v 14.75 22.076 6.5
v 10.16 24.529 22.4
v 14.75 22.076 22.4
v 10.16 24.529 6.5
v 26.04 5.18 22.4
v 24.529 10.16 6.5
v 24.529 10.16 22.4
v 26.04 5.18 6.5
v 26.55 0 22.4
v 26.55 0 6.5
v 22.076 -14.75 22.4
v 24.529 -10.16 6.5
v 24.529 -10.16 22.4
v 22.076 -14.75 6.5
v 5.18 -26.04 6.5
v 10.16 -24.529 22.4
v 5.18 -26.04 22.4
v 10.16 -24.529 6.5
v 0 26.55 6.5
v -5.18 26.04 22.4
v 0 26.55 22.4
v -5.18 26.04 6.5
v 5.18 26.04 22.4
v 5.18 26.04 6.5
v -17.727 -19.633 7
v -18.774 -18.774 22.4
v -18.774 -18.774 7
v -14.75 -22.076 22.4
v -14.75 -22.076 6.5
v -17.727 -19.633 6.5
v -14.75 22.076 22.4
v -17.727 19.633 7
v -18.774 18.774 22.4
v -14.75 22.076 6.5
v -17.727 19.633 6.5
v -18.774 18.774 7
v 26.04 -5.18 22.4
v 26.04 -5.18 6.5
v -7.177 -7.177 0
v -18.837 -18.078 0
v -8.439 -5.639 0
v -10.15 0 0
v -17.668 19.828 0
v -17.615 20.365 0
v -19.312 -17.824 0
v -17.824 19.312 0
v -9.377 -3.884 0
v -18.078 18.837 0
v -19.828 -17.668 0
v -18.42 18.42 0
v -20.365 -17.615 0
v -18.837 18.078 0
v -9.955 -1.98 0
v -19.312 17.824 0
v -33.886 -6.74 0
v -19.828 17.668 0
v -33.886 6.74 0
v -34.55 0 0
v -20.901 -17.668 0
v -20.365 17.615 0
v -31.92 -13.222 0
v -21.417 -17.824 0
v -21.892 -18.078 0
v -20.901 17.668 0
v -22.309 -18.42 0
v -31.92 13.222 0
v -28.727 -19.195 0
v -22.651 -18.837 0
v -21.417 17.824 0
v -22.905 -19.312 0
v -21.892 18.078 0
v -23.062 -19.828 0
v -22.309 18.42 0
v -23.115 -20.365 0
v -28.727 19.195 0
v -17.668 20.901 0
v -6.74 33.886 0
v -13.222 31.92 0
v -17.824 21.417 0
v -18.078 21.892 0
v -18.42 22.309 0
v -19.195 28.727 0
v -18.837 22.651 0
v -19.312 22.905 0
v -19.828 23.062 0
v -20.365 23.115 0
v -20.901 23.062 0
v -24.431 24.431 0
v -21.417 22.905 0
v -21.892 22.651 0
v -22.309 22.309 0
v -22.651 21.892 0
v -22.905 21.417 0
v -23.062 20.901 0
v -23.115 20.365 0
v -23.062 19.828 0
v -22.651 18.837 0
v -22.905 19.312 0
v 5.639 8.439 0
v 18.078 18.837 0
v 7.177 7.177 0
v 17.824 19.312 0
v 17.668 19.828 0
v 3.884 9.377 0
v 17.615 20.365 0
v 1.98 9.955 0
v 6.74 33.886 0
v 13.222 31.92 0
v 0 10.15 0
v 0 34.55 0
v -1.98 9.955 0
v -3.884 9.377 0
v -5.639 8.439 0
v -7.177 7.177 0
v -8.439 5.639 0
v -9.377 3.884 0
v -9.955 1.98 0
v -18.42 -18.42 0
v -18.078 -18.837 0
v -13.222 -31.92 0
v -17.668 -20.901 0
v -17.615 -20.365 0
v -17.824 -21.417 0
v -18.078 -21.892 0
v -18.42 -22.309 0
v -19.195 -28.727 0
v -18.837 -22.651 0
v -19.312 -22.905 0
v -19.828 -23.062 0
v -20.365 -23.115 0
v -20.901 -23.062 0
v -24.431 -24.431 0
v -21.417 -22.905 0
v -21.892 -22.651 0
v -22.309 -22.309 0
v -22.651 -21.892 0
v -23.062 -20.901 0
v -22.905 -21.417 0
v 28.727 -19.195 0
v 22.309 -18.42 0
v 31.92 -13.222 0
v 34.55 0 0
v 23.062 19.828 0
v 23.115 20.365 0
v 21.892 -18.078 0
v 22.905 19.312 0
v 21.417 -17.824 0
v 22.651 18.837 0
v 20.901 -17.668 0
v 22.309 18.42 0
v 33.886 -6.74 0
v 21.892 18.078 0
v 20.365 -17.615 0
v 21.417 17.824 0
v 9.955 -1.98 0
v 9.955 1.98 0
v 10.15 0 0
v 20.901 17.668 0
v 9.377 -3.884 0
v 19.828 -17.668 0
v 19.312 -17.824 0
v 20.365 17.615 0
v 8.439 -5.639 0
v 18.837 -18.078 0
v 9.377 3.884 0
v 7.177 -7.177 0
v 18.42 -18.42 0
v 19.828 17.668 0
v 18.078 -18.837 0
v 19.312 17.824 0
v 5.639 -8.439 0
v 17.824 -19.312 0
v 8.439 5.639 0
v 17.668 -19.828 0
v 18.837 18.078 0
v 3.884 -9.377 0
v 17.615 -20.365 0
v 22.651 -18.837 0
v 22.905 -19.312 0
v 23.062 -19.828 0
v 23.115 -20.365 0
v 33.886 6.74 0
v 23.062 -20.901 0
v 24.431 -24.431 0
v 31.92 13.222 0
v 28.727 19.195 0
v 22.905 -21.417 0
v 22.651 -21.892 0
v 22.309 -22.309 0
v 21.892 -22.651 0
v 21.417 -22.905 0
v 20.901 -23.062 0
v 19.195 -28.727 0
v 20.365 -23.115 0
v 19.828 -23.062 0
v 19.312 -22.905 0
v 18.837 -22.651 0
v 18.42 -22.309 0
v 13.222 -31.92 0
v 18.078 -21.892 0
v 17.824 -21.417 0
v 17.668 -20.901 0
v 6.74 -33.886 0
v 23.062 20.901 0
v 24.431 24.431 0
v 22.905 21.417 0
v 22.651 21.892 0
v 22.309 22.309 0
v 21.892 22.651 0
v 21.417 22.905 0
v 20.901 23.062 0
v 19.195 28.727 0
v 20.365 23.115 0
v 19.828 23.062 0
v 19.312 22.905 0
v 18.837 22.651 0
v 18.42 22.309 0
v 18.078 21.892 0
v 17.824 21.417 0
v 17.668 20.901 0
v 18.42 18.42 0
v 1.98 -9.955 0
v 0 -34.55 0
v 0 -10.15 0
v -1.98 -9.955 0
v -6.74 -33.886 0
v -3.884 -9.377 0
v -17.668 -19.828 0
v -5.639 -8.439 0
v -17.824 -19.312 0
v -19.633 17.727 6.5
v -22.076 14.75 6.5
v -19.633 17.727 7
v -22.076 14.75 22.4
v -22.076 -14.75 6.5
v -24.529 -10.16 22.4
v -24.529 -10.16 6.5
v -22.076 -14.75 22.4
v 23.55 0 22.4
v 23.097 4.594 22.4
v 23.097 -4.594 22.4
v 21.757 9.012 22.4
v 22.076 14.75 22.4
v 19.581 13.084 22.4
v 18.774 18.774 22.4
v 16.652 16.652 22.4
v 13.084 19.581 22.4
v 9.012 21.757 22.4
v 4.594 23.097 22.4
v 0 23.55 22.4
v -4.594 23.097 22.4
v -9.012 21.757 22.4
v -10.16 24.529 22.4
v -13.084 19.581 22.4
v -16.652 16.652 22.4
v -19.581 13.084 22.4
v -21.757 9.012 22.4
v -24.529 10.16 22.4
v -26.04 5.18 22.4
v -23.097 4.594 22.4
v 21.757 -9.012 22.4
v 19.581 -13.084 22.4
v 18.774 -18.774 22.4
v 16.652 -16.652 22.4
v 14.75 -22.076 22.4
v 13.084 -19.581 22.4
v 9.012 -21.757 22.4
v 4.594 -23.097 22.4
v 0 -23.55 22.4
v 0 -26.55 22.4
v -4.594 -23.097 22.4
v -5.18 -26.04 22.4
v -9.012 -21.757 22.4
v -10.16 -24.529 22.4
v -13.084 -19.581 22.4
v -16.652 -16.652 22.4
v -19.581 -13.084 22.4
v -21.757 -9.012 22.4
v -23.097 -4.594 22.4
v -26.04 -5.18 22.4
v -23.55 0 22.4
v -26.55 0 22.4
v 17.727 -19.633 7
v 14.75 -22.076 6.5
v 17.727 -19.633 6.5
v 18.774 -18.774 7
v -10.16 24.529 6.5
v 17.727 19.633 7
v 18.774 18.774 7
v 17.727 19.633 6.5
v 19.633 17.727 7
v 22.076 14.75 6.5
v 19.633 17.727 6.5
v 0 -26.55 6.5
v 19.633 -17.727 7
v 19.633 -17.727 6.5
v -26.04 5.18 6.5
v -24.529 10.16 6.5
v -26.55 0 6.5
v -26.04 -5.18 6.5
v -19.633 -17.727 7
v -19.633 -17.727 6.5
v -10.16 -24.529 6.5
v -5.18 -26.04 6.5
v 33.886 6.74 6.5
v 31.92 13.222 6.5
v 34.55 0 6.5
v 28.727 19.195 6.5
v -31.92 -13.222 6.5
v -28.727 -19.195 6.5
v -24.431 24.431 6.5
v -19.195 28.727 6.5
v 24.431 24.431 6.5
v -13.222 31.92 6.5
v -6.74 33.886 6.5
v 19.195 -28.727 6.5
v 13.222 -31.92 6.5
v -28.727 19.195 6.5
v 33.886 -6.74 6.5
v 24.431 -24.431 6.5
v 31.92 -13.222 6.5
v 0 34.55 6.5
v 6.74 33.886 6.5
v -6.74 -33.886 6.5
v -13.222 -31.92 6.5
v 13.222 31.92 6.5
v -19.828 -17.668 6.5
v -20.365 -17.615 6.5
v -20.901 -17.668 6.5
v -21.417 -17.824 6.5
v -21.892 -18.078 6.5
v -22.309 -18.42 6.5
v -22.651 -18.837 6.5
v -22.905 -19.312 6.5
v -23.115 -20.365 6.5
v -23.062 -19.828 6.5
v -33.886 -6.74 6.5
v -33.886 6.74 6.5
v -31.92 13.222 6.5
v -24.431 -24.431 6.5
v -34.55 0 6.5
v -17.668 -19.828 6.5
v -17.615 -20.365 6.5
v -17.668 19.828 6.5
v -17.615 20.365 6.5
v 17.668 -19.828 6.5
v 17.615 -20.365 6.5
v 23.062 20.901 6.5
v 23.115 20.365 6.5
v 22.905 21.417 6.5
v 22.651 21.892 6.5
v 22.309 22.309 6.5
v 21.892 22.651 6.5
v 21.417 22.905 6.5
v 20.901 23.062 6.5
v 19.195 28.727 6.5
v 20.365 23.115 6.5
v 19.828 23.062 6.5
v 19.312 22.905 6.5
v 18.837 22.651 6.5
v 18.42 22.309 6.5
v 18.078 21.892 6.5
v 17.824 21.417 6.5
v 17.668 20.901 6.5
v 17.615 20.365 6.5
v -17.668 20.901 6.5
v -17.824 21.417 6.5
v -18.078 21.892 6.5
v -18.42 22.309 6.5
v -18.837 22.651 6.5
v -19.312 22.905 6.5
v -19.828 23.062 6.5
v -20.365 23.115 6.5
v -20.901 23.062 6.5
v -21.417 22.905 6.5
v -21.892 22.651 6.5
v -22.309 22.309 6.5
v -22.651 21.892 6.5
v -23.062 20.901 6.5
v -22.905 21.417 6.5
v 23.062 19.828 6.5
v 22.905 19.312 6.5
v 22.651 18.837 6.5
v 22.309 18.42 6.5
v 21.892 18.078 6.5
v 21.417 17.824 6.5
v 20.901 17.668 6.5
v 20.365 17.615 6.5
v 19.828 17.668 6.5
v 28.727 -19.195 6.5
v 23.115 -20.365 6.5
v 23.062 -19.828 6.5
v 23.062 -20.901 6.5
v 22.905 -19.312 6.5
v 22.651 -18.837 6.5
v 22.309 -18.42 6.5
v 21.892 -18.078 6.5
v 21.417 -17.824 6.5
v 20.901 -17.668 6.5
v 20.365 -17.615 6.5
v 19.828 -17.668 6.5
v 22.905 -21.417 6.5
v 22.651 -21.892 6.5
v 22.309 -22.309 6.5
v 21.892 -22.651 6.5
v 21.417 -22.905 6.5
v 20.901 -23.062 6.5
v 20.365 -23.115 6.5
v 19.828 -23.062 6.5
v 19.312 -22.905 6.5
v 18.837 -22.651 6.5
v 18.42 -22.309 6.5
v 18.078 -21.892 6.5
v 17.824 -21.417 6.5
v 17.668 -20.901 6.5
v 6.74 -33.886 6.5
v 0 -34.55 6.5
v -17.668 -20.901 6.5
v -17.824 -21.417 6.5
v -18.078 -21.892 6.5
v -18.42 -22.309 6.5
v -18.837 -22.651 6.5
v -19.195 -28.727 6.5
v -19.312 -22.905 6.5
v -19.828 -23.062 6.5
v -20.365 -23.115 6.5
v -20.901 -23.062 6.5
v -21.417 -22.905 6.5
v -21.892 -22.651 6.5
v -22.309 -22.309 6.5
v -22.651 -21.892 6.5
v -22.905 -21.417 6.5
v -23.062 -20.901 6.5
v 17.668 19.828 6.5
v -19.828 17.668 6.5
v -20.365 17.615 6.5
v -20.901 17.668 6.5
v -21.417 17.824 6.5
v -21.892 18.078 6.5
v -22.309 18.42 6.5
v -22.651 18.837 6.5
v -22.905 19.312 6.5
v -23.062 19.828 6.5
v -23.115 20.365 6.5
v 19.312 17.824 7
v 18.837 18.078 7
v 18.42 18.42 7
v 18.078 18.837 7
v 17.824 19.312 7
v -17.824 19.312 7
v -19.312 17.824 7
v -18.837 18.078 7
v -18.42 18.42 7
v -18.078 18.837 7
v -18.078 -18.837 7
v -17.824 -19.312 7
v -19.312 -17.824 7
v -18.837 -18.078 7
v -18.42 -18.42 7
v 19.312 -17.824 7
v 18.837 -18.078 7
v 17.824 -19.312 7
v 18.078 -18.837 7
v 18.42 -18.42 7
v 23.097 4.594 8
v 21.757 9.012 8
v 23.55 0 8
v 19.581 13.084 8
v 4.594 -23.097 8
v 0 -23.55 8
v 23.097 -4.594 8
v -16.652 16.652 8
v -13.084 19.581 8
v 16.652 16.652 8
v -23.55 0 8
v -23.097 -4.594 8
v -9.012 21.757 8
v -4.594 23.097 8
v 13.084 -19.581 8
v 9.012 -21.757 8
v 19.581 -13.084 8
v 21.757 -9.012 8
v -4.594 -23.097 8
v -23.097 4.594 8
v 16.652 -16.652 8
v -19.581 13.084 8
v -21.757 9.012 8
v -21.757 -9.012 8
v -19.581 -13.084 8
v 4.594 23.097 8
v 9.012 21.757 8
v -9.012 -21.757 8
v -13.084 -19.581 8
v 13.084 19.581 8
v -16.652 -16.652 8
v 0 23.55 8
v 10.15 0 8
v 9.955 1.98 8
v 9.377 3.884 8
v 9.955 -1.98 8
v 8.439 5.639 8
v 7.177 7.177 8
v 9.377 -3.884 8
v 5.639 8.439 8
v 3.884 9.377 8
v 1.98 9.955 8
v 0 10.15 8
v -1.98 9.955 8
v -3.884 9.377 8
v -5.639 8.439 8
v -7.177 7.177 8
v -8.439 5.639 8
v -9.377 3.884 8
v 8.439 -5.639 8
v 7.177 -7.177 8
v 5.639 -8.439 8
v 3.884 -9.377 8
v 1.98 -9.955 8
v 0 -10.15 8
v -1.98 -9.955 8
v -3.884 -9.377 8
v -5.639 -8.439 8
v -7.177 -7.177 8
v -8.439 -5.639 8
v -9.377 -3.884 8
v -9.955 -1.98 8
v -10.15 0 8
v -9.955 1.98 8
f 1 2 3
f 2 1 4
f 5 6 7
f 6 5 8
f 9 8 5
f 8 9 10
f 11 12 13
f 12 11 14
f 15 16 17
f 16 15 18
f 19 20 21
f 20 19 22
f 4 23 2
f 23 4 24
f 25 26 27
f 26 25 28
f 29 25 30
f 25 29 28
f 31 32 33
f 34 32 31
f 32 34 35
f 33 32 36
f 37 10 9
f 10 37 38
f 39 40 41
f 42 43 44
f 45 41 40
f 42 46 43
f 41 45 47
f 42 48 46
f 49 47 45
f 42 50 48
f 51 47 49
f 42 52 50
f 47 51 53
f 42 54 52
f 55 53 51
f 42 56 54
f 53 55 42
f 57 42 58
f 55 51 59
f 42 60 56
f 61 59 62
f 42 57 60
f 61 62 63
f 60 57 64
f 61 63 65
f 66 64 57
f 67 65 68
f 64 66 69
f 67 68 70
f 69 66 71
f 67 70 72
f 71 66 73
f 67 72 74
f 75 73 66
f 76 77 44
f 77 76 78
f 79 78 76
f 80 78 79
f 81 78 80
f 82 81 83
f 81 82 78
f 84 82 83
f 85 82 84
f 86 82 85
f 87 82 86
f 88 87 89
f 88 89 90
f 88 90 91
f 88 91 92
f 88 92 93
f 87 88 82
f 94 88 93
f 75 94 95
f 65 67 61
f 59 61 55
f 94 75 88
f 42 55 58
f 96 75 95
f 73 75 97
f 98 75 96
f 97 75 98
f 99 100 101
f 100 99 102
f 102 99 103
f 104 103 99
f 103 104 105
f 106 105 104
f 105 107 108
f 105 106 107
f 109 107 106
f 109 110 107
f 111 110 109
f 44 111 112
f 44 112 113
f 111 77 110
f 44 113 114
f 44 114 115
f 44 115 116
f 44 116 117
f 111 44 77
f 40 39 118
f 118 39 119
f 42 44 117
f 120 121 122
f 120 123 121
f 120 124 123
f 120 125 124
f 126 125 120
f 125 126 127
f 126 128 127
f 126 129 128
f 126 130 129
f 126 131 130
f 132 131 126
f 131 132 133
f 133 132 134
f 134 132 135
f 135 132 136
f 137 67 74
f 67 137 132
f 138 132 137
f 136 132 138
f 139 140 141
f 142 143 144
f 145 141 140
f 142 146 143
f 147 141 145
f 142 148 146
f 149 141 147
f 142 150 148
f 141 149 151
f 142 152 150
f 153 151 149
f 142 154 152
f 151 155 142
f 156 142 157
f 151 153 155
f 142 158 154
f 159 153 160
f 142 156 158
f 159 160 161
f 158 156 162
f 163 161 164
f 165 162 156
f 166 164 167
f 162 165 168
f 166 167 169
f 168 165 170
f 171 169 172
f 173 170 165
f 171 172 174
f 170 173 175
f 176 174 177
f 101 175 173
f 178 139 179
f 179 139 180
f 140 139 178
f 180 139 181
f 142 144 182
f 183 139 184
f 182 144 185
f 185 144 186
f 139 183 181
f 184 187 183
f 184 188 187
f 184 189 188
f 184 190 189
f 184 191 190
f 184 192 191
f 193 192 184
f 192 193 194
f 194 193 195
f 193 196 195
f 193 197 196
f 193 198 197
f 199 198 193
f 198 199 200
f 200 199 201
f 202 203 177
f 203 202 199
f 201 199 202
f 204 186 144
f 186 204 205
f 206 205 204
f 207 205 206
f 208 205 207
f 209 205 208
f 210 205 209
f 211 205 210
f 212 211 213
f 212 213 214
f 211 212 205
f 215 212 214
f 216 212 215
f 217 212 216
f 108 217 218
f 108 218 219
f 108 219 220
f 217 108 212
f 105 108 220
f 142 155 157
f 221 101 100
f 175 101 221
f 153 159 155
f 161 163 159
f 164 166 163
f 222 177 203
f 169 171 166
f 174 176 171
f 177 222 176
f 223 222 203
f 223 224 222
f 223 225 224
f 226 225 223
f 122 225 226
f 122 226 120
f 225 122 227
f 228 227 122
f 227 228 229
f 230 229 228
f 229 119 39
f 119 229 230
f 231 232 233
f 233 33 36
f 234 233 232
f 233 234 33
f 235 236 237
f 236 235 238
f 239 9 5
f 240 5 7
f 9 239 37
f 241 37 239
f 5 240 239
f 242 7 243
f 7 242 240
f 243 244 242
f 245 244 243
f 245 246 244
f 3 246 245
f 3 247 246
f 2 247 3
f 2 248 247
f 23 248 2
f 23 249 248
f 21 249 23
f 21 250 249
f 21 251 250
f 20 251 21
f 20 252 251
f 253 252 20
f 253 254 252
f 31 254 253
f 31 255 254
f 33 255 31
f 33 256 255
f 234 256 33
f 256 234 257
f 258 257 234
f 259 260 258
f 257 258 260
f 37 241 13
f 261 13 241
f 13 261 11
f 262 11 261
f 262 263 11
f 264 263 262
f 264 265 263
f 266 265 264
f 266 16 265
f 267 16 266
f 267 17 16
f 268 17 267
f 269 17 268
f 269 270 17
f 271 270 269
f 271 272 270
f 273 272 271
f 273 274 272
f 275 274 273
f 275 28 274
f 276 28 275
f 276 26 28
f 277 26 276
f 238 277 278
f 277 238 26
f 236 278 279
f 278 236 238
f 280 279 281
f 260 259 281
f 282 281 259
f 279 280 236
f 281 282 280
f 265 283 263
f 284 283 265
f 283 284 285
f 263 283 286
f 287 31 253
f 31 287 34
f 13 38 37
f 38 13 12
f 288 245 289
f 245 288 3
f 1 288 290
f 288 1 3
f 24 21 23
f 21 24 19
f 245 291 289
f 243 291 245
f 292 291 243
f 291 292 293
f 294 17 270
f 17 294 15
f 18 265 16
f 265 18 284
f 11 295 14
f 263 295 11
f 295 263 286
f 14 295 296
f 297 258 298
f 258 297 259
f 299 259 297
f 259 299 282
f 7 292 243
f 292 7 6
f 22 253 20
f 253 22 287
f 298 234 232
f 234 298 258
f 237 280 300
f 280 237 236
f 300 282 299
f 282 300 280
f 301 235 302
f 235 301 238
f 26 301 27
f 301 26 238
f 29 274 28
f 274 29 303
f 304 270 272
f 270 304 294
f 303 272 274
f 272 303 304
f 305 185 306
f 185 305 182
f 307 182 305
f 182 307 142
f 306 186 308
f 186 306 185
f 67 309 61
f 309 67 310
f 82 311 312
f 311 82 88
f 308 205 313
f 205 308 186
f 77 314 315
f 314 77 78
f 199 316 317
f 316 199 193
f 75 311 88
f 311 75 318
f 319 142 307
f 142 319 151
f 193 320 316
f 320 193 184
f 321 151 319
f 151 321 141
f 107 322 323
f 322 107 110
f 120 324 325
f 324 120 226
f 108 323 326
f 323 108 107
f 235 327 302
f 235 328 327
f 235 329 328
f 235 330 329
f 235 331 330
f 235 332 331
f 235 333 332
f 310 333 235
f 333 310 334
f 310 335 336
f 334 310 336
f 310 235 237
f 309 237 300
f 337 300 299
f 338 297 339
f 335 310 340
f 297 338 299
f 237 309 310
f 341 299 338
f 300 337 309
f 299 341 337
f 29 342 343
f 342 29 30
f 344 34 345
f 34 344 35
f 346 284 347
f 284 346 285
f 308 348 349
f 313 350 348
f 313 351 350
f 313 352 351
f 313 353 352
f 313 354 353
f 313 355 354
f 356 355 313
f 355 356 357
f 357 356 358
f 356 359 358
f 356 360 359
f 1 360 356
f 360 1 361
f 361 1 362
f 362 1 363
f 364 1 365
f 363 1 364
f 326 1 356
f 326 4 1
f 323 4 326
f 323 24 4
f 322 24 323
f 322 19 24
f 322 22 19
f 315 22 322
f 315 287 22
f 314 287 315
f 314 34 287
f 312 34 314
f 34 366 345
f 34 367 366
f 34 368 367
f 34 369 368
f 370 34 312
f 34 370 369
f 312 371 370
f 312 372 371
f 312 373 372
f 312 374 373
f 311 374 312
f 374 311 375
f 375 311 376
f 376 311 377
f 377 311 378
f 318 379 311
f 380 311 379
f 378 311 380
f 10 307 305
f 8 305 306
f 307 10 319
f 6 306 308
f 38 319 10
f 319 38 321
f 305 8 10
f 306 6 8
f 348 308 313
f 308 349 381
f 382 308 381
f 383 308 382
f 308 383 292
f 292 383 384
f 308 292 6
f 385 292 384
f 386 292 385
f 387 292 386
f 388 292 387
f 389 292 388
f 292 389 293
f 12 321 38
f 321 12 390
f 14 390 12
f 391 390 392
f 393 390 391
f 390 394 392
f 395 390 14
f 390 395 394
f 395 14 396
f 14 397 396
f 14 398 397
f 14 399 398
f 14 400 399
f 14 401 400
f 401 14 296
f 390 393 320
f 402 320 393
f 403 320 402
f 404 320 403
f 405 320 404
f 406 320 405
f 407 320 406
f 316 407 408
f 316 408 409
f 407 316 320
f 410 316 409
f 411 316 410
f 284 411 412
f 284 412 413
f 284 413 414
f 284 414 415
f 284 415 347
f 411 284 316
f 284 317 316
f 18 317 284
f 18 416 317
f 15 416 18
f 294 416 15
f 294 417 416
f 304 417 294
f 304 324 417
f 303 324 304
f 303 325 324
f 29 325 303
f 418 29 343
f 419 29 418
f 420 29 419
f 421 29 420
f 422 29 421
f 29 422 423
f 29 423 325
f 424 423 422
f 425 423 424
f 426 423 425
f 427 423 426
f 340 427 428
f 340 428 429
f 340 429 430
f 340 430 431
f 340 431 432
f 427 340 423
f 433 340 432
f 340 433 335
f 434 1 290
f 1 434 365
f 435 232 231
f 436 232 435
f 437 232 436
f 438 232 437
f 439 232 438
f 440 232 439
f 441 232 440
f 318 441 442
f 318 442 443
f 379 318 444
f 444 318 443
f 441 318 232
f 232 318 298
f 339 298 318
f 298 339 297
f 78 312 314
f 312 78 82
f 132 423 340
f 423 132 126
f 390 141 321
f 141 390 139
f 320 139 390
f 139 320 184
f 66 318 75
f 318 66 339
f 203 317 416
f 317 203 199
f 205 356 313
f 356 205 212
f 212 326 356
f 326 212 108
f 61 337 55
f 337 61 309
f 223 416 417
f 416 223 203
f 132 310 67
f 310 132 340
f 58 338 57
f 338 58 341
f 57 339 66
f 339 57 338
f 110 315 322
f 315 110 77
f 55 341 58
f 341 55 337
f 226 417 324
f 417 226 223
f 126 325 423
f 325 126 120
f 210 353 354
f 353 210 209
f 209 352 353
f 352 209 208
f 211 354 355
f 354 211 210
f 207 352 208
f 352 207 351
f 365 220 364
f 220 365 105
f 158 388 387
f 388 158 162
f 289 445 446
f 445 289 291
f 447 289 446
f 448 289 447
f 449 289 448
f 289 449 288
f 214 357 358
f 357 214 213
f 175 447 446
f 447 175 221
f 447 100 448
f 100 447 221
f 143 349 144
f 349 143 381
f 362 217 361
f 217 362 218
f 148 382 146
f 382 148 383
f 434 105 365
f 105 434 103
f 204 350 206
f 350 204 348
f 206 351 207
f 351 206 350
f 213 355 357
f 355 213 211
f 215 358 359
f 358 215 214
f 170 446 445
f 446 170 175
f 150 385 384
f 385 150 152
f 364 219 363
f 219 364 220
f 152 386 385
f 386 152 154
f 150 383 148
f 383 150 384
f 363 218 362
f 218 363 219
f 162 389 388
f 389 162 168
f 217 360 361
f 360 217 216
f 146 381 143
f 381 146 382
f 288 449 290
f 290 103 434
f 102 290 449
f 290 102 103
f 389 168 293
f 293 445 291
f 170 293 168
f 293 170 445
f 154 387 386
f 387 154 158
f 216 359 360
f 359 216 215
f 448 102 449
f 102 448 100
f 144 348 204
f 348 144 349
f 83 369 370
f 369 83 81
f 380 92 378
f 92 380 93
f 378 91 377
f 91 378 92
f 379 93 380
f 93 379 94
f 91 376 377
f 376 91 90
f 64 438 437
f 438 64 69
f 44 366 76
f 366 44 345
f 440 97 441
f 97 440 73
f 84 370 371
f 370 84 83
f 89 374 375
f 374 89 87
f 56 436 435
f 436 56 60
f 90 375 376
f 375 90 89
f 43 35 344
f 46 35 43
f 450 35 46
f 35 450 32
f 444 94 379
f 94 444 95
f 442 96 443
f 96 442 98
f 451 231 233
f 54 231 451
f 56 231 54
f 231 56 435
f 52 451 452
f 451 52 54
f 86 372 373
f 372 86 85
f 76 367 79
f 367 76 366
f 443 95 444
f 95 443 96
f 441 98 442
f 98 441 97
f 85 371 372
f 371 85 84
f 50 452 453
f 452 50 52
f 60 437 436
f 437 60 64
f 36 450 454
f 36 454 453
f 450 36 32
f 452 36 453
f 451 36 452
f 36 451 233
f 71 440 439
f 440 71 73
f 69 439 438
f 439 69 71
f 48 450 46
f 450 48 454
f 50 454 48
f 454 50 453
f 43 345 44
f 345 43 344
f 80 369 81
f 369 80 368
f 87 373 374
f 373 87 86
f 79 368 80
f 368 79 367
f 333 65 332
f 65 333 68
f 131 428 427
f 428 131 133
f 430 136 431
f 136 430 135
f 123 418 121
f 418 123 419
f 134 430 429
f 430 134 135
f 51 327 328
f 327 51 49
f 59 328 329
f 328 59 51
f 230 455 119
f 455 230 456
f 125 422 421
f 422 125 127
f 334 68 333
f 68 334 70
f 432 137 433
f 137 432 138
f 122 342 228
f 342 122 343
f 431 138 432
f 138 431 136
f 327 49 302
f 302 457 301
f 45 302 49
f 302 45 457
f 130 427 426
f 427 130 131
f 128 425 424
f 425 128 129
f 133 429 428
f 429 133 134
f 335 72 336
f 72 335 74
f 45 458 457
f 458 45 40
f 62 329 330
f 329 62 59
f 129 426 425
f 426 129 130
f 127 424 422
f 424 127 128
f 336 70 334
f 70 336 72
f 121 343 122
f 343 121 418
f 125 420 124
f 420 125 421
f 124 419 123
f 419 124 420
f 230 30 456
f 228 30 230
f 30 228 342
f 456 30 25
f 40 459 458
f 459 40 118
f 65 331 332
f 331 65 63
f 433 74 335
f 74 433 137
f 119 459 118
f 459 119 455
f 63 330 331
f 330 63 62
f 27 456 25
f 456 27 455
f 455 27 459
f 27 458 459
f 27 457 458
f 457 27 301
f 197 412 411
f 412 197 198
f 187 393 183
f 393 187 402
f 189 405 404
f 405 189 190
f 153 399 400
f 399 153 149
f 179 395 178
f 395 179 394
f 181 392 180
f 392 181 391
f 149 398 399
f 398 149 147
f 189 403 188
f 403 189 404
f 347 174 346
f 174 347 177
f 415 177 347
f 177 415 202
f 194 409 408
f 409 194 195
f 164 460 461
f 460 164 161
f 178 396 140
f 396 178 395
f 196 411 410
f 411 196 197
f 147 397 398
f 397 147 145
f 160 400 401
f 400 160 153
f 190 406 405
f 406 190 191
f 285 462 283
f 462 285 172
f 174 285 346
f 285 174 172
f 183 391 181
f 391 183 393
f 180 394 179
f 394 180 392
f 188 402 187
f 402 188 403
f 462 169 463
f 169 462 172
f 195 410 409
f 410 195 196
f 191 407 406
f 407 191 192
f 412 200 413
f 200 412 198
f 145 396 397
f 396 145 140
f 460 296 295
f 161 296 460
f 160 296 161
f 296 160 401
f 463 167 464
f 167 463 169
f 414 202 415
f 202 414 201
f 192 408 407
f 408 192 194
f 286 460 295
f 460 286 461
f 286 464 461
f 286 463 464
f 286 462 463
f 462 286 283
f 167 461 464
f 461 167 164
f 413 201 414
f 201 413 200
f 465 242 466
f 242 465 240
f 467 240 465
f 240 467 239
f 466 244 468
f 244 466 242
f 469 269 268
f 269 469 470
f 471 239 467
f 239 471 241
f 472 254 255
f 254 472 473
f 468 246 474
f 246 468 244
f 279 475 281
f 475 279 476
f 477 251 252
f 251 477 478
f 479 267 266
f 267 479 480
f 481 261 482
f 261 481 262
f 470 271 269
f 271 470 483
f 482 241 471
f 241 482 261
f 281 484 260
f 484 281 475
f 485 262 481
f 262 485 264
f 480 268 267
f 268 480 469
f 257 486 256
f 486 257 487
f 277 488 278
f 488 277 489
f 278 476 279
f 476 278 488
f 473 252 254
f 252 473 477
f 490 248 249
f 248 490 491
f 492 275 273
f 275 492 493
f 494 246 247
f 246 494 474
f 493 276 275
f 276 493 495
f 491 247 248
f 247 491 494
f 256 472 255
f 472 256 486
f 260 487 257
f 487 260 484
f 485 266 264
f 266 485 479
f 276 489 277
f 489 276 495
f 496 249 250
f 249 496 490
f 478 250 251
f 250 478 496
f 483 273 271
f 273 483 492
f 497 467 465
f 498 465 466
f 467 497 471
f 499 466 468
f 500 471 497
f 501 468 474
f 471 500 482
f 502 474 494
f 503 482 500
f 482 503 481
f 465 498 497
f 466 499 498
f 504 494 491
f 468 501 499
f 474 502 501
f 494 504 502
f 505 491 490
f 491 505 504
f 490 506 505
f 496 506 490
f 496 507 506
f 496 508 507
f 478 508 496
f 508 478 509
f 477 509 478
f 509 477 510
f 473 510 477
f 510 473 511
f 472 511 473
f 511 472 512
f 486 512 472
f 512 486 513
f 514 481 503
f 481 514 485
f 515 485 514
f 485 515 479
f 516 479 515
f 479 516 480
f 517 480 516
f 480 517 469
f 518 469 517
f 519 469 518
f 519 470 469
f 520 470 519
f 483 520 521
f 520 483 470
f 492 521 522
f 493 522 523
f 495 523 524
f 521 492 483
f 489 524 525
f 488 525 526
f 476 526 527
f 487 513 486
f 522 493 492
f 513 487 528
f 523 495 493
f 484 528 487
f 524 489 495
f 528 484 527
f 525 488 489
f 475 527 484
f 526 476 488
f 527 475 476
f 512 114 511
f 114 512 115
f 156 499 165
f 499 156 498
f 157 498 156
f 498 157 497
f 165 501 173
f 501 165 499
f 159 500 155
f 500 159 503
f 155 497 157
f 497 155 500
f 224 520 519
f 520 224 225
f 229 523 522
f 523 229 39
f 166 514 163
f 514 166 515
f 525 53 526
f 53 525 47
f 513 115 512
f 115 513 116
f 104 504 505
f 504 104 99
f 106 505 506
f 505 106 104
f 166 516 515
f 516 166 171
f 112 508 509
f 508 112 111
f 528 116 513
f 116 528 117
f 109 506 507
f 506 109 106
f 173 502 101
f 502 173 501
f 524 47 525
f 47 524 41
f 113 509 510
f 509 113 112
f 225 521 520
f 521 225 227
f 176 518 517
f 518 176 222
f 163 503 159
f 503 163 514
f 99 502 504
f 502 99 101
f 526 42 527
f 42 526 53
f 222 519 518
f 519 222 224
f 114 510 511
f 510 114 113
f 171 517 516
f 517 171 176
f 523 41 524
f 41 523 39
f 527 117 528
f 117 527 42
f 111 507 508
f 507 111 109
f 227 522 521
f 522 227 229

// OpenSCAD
$fn = 32;

// ----------------------------------------------------------------------
// Bearing housing: seat for 6204 (47 x 14 mm), 53.1 mm body
// ----------------------------------------------------------------------

// --- parameters (mm) ---
case_d = 53.1;            // housing outside diameter
case_h = 22.4;            // overall housing height
rim_t = 3;                // wall thickness
bearing_seat = 47.1;      // 6204 seat, 0.1 mm clearance
seat_h = 14.4;            // pocket depth
shoulder = 3;             // shoulder under the bearing
pass_d = 20.3;            // shaft passage
ear_d = 69.1;             // mounting flange diameter
flange_t = 5;             // flange thickness
bolt_d = 5.5;             // flange bolt clearance
bolt_r = 28.8;            // flange bolt circle radius

module body() {
  cylinder(h = case_h, d = case_d);
}

module flange() {
  /* flange sunk 1.5 mm into the body */
  cylinder(h = flange_t + 1.5, d = ear_d);
}

difference() {
  union() {
    body();
    flange();
  }
  translate([0, 0, case_h - seat_h]) cylinder(h = seat_h + 1, d = bearing_seat);
  translate([0, 0, -1]) cylinder(h = case_h - seat_h + 1, d = pass_d);
  for (i = [0 : 3]) rotate([0, 0, 45 + i * 90]) translate([bolt_r, 0, -1])
    cylinder(h = flange_t + 3, d = bolt_d);
}
